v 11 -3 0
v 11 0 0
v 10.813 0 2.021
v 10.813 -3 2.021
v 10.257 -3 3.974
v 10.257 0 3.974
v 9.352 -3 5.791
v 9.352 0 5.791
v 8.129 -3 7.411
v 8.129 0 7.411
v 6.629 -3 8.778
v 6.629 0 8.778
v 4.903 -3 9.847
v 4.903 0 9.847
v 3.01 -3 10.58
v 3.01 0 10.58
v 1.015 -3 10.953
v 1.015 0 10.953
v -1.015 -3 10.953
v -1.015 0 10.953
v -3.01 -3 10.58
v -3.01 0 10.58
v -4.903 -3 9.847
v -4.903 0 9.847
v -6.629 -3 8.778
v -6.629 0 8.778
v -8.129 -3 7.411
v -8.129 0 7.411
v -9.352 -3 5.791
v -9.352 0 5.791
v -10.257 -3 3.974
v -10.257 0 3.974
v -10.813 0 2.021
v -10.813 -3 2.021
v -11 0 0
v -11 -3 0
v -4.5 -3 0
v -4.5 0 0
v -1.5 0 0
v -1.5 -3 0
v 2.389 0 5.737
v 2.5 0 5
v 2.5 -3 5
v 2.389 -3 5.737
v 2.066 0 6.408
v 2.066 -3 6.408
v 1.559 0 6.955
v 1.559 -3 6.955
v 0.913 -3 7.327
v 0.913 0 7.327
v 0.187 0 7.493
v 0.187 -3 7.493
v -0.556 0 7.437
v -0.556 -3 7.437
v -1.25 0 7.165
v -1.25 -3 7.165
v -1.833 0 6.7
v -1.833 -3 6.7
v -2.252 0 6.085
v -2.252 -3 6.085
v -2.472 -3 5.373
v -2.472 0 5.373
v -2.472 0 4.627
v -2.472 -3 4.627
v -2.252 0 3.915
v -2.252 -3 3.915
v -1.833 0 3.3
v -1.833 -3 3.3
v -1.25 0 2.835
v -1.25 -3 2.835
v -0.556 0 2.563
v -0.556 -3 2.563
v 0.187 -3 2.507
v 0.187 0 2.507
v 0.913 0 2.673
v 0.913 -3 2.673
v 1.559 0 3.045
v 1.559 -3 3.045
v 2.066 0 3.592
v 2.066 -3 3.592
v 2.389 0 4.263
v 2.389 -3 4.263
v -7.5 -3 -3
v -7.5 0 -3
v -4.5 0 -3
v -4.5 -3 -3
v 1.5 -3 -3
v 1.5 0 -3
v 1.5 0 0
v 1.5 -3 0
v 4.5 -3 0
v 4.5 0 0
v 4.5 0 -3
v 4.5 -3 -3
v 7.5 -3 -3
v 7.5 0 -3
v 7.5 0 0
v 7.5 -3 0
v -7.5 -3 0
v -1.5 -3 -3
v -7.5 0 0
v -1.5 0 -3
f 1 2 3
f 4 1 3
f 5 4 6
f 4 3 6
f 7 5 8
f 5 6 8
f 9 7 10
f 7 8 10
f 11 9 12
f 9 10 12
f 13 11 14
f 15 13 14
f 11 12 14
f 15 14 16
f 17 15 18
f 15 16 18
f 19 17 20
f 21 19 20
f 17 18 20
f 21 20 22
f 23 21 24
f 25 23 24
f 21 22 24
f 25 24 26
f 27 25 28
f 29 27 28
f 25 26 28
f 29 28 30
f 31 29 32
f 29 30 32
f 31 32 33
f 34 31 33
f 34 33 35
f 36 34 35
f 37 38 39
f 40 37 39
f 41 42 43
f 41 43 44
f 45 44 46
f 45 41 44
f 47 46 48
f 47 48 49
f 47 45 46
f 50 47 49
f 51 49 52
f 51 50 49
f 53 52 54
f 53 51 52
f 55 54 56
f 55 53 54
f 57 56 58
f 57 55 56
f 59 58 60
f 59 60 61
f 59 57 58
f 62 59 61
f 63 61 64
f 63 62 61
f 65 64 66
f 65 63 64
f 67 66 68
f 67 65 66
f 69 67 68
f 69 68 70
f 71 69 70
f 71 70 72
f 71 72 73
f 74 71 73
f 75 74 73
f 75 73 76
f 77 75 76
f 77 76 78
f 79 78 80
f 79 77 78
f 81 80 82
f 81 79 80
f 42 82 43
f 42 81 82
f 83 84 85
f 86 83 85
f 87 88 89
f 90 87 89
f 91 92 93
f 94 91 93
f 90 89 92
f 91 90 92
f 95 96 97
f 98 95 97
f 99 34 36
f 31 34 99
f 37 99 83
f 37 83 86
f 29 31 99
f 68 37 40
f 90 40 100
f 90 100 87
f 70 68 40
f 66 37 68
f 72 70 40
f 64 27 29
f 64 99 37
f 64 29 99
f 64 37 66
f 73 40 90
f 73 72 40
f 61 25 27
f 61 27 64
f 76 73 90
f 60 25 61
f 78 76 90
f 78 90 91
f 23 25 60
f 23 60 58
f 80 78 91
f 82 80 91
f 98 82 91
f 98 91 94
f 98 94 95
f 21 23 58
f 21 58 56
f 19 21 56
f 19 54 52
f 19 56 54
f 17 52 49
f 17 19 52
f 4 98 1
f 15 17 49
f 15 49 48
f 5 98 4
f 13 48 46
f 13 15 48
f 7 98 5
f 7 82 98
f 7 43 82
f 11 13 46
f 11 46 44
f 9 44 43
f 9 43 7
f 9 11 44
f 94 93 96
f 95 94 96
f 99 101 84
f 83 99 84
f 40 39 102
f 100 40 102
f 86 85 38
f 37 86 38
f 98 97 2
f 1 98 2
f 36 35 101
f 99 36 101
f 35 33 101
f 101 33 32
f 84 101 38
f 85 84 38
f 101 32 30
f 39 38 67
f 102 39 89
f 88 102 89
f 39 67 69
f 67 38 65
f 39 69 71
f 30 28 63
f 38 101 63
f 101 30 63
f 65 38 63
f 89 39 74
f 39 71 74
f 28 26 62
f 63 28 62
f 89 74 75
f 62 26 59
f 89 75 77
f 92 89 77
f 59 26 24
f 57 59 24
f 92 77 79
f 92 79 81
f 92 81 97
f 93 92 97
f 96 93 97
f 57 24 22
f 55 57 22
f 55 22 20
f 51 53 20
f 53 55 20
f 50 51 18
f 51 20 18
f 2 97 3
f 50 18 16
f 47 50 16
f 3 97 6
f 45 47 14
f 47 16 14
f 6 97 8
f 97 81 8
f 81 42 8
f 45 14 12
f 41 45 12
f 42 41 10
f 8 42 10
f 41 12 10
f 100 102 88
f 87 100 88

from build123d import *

# Parameters (mm, degrees)
F0_R     = 2.5
F1_DEPTH = 3


# Not quite as in the source:
# - a feature names something its author has since deleted; it is built from what else it names


with BuildPart() as f1:
    # F0 (on Front) → F1 (new body)
    with BuildSketch(Plane.XZ):
        with BuildLine():
            Line((7.5, 0), (11, 0))
            ThreePointArc((11, 0), (0, 11), (-11, 0))
            Line((-11, 0), (-7.5, 0))
            Line((-7.5, 0), (-7.5, -3))
            Line((-7.5, -3), (-4.5, -3))
            Line((-4.5, -3), (-4.5, 0))
            Line((-4.5, 0), (-1.5, 0))
            Line((-1.5, 0), (-1.5, -3))
            Line((-1.5, -3), (1.5, -3))
            Line((1.5, -3), (1.5, 0))
            Line((1.5, 0), (4.5, 0))
            Line((4.5, 0), (4.5, -3))
            Line((4.5, -3), (7.5, -3))
            Line((7.5, -3), (7.5, 0))
        make_face()
        with Locations((0, 5)):
            Circle(F0_R, mode=Mode.SUBTRACT)
    extrude(amount=F1_DEPTH)


solid = f1.part
